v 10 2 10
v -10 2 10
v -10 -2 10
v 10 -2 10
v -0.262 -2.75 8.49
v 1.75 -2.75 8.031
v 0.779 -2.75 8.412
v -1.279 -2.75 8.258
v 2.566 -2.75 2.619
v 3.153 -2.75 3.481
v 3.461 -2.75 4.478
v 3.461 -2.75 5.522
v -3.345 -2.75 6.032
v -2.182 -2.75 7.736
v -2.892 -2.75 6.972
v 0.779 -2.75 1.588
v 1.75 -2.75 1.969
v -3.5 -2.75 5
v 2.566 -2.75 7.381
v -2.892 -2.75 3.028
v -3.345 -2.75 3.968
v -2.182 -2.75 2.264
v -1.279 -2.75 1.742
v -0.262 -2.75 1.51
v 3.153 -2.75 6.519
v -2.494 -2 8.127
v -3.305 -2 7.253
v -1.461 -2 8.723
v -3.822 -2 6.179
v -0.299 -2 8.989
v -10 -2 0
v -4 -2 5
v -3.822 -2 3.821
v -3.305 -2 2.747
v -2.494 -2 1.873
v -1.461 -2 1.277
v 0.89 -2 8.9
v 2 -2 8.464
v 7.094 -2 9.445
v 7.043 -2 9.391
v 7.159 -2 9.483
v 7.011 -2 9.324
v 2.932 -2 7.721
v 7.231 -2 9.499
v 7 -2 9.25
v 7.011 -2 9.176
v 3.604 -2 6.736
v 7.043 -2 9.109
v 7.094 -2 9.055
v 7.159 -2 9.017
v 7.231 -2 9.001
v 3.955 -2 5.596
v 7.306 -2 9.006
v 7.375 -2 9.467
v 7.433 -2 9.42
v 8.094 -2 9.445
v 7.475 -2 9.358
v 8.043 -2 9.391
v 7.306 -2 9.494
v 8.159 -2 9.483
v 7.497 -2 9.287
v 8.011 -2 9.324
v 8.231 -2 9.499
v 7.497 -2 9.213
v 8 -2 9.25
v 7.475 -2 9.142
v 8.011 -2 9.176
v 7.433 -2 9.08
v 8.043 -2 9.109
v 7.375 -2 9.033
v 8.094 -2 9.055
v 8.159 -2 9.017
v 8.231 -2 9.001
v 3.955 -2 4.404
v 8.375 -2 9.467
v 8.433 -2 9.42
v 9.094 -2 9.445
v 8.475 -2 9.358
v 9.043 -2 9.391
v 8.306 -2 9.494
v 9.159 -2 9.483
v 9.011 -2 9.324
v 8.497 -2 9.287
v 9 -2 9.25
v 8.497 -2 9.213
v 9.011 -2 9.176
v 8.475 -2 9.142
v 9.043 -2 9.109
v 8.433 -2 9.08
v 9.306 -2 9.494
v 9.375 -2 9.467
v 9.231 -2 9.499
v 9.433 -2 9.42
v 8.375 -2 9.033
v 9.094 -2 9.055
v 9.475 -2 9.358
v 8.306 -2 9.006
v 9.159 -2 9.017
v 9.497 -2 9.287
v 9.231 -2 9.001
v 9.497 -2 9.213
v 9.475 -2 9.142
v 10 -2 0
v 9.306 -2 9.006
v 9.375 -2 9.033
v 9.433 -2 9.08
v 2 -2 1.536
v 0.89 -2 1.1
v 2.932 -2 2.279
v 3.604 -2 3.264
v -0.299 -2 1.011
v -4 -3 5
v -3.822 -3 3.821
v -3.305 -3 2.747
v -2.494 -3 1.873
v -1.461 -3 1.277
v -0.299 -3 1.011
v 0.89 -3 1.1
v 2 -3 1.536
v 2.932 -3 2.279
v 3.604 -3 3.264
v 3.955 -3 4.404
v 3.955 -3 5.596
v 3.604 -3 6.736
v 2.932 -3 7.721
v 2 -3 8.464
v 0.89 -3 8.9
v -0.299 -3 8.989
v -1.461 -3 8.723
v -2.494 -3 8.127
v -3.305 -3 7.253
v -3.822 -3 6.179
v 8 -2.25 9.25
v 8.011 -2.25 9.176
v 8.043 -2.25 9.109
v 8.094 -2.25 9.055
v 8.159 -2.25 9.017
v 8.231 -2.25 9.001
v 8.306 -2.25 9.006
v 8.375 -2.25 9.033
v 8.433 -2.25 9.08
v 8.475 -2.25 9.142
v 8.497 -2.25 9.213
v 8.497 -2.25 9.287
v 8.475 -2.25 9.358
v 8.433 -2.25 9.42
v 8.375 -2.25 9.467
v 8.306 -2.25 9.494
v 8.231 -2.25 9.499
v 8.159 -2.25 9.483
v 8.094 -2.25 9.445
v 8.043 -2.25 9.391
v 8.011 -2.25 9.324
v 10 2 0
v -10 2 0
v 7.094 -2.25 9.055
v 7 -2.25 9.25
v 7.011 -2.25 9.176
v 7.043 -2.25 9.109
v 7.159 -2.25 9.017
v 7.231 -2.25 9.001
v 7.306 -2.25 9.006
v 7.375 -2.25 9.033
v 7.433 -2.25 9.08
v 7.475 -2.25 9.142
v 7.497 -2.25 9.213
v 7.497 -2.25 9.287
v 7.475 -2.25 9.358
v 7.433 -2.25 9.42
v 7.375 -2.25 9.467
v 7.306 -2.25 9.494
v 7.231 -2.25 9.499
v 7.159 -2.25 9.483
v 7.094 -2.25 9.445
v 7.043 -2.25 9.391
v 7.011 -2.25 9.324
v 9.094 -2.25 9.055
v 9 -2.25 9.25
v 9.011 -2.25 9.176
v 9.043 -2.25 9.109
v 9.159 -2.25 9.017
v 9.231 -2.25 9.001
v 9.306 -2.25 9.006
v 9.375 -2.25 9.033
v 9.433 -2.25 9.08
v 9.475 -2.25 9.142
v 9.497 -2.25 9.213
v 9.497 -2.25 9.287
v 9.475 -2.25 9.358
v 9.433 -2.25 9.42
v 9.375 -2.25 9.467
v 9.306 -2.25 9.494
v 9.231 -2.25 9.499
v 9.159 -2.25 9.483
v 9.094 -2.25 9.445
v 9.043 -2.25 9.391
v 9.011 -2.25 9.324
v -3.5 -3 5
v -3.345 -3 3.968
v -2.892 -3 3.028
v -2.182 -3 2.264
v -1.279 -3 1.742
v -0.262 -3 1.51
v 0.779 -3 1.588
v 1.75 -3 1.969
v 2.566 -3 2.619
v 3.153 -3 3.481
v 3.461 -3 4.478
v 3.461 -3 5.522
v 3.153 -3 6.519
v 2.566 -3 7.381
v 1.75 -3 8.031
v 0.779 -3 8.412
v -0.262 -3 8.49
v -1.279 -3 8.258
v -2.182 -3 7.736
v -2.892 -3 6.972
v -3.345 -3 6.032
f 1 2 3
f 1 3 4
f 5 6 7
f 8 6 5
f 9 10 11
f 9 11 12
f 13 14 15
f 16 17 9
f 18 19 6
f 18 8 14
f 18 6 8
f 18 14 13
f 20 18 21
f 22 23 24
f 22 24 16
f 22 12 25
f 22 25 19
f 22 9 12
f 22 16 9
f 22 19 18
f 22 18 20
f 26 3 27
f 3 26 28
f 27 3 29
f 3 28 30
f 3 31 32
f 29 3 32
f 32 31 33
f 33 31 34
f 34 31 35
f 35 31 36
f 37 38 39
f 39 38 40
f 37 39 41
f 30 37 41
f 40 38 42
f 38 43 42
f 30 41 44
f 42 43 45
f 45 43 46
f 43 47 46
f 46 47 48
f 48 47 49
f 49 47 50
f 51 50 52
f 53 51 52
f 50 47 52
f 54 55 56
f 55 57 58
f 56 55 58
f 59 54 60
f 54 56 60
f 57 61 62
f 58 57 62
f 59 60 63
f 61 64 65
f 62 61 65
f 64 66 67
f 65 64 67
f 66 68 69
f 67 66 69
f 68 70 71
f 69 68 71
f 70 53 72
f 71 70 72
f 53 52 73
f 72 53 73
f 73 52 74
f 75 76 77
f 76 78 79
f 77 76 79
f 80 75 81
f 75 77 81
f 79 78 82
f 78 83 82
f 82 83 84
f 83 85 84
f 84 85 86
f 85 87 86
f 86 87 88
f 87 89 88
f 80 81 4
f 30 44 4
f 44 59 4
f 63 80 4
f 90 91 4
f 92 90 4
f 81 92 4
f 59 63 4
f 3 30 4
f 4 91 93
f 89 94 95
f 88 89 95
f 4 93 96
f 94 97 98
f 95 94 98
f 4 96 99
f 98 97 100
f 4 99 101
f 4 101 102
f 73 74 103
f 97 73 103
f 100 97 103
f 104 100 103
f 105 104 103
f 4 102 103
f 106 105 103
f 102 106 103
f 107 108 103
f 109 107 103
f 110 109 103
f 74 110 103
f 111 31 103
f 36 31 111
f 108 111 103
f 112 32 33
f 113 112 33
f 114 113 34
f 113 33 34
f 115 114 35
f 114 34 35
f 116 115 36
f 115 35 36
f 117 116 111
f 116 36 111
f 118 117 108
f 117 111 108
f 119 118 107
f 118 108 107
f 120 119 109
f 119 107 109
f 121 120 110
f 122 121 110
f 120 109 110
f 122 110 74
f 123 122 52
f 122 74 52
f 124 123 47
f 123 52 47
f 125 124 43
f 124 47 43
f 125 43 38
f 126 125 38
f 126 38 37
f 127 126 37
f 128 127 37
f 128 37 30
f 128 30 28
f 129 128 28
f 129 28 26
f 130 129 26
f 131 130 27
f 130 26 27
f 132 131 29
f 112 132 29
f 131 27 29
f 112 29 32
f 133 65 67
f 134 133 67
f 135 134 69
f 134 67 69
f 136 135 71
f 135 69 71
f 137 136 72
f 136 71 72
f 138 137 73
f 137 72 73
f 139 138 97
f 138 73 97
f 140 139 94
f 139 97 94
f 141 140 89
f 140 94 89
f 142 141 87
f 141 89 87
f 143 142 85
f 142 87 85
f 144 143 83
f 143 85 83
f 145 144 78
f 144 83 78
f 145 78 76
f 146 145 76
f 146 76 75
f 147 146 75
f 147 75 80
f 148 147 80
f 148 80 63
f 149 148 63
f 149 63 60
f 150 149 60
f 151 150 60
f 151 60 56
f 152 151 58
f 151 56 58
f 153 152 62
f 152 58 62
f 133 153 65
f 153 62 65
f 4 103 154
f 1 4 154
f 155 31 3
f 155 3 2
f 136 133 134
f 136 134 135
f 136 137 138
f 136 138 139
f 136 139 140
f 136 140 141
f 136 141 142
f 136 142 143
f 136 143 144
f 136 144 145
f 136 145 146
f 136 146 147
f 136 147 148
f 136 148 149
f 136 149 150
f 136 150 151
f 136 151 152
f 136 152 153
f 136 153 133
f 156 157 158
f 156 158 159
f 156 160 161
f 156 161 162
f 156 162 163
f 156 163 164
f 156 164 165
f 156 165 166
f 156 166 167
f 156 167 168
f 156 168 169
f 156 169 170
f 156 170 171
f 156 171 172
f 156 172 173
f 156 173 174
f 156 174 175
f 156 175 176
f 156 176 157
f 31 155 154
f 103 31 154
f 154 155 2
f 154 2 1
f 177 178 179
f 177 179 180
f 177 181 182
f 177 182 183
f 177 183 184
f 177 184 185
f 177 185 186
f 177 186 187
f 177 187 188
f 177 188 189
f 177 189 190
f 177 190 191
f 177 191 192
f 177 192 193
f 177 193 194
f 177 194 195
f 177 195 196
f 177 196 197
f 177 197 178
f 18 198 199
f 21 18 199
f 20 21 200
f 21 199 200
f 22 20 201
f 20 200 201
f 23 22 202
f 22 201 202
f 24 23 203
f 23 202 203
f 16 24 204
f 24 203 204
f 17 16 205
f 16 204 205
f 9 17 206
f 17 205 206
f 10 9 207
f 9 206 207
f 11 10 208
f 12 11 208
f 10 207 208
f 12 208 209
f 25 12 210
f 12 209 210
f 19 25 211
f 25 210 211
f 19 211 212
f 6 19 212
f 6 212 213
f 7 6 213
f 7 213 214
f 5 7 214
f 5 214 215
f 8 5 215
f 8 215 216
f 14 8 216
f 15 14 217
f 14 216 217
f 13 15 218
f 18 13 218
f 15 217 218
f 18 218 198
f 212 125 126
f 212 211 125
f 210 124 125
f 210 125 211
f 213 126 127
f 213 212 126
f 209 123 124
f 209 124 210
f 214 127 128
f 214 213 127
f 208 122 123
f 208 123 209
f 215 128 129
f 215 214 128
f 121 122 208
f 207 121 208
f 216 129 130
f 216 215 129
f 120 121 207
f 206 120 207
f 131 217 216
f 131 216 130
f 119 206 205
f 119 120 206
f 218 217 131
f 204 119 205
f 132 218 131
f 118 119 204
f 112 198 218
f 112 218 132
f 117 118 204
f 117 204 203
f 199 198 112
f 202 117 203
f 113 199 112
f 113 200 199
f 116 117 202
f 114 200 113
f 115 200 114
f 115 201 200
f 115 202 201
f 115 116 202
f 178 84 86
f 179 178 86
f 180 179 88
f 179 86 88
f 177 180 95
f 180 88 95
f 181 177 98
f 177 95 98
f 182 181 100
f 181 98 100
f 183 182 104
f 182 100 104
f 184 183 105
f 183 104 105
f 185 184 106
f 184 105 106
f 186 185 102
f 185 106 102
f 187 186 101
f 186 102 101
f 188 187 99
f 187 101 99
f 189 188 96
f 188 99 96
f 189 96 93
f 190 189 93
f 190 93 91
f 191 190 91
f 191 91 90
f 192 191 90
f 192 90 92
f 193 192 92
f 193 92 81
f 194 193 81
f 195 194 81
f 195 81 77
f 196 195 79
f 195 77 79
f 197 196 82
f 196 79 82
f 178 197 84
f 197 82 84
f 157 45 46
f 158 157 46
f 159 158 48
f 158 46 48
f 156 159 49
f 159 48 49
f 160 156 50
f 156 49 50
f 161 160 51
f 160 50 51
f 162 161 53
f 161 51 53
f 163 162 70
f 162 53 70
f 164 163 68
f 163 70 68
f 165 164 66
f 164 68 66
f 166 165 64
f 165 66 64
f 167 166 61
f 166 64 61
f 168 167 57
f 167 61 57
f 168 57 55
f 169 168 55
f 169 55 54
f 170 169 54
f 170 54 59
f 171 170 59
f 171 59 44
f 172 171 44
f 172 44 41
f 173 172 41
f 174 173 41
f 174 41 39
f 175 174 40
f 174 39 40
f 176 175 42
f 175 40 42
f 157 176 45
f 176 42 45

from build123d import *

# Parameters (mm, degrees)
SKETCH1_W           = 20
SKETCH1_H           = 4
BOSS_EXTRUDE1_DEPTH = 10
SKETCH2_R           = 4
BOSS_EXTRUDE2_DEPTH = 1
SKETCH5_R           = 3.5
CUT_EXTRUDE1_DEPTH  = 0.25
SKETCH6_R           = 0.25
BOSS_EXTRUDE3_DEPTH = 0.25


with BuildPart() as part:
    # Sketch1 → Boss-Extrude1 (new body)
    with BuildSketch(Plane.XY):
        Rectangle(SKETCH1_W, SKETCH1_H)
    extrude(amount=BOSS_EXTRUDE1_DEPTH)

    # Sketch2 → Boss-Extrude2 (add)
    with BuildSketch(Plane(origin=(0, -2, 0), x_dir=(-1, 0, 0), z_dir=(0, -1, 0))):
        with Locations((0, -5)):
            Circle(SKETCH2_R)
    extrude(amount=BOSS_EXTRUDE2_DEPTH)

    # Sketch5 → Cut-Extrude1 (cut)
    with BuildSketch(Plane(origin=(0, -3, 0), x_dir=(-1, 0, 0), z_dir=(0, -1, 0))):
        with Locations((0, -5)):
            Circle(SKETCH5_R)
    extrude(amount=-CUT_EXTRUDE1_DEPTH, mode=Mode.SUBTRACT)

    # Sketch6 → Boss-Extrude3 (add)
    with BuildSketch(Plane(origin=(0, -2, 0), x_dir=(-1, 0, 0), z_dir=(0, -1, 0))):
        with Locations((-7.25, -9.25)):
            Circle(SKETCH6_R)
        with Locations((-8.25, -9.25)):
            Circle(SKETCH6_R)
        with Locations((-9.25, -9.25)):
            Circle(SKETCH6_R)
    extrude(amount=BOSS_EXTRUDE3_DEPTH)


solid = part.part
